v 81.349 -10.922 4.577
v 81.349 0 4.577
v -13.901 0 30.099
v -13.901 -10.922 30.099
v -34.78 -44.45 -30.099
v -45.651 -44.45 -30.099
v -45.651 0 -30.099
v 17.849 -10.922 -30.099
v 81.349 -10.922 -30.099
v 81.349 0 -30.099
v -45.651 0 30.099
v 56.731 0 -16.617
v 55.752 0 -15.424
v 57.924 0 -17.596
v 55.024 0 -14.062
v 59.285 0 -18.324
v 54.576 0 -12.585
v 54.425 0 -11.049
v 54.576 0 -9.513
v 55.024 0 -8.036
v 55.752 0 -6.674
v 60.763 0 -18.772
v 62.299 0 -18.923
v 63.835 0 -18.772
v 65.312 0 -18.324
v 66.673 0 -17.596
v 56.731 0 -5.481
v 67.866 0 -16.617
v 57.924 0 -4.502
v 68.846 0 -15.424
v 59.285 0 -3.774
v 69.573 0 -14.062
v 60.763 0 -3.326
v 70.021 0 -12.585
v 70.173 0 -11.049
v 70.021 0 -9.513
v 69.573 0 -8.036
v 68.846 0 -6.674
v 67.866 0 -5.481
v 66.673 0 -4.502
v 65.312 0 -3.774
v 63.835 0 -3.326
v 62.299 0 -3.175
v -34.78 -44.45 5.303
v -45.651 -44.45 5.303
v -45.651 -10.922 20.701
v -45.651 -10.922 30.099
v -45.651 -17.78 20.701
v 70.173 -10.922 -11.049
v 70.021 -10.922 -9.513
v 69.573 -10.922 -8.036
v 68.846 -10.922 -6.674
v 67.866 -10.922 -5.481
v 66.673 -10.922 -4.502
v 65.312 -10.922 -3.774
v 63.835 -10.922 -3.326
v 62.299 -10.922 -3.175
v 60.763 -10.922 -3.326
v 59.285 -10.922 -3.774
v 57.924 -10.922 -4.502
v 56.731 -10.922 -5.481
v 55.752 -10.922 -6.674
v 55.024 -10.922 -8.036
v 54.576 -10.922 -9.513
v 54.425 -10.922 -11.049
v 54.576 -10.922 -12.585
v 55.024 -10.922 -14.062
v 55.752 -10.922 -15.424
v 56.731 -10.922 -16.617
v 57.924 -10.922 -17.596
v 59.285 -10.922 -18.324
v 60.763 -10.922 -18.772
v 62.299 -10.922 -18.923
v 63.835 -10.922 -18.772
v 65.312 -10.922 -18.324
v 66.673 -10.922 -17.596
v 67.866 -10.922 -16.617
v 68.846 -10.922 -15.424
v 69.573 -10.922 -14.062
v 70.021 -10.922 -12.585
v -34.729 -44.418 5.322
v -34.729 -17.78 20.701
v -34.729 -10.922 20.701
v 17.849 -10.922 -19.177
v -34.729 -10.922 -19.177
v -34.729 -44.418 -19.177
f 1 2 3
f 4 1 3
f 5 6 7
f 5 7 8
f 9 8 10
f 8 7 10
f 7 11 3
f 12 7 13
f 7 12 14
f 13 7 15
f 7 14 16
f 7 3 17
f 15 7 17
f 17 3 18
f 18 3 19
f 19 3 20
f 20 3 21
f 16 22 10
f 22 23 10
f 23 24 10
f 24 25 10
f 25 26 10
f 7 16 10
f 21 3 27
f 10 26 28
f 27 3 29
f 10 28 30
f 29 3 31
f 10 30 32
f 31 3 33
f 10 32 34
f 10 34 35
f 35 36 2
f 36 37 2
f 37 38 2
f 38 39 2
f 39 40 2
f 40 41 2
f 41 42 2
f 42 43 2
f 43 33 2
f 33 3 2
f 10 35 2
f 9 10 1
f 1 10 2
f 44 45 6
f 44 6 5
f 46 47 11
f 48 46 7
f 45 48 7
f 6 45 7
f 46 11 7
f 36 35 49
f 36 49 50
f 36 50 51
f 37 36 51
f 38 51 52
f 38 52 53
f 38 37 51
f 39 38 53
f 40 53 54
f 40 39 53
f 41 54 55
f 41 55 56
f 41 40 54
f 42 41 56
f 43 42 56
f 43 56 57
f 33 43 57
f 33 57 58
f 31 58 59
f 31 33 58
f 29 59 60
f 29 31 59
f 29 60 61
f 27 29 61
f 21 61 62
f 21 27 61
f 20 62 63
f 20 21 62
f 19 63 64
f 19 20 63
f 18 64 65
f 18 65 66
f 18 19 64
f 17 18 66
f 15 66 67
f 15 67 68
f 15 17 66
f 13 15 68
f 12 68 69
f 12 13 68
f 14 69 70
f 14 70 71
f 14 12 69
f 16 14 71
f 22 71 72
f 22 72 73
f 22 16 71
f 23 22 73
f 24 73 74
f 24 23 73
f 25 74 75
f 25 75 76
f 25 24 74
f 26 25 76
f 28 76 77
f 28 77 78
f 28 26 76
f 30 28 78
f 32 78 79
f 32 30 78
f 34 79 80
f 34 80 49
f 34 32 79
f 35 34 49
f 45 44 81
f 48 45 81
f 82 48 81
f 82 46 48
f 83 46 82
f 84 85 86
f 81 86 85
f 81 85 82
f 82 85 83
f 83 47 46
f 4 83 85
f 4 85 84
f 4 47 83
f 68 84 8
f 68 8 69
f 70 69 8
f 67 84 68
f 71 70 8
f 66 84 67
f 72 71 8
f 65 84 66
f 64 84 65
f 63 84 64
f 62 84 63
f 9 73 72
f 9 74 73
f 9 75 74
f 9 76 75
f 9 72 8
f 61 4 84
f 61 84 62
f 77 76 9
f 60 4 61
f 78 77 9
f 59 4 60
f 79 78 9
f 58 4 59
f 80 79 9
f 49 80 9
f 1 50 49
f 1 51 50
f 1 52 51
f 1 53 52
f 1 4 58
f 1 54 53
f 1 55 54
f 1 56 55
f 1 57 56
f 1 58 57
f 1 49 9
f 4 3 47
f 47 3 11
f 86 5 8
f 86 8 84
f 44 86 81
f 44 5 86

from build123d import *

# Parameters (mm, degrees)
F0_W     = 10.922
F0_H     = 28.702
F0_W_2   = 52.578
F0_H_2   = 10.922
F0_R     = 7.874
F1_DEPTH = 10.922
F2_DEPTH = 44.45
F3_SIZE2 = 52.628408
F3_SIZE  = 33.52799
F4_SIZE2 = 15.3979316793
F4_SIZE  = 26.67


# Not quite as in the source:
# - a fillet or chamfer is up to 0.001 mm smaller than in the source, because OpenCascade refuses the exact size


with BuildPart() as f1:
    # F0 (on Front) → F1 (new body)
    with BuildSketch(Plane.XZ):
        with Locations((-40.1902680954, 6.35)):
            Rectangle(F0_W, F0_H)
        with Locations((-8.4402680954, -24.638)):
            Rectangle(F0_W_2, F0_H_2)
        Polygon((-13.9012680954, 30.099), (-45.6512680954, 30.099), (-45.6512680954, 20.701), (-34.7292680954, 20.701), (-34.7292680954, -8.001), (-34.7292680954, -19.177), (17.8487319046, -19.177), (17.8487319046, -30.099), (81.3487319046, -30.099), (81.3487319046, 4.5768394209), align=None)
        with Locations((62.2987319046, -11.049)):
            Circle(F0_R, mode=Mode.SUBTRACT)
        Polygon((-34.7292680954, -8.001), (-45.6512680954, -8.001), (-45.6512680954, -30.099), (-34.7292680954, -30.099), (-34.7292680954, -19.177), align=None)
    extrude(amount=F1_DEPTH)

    # F0 (on Front) → F2 (join)
    with BuildSketch(Plane.XZ):
        with Locations((-40.1902680954, 6.35)):
            Rectangle(F0_W, F0_H)
        with Locations((-8.4402680954, -24.638)):
            Rectangle(F0_W_2, F0_H_2)
        Polygon((-34.7292680954, -8.001), (-45.6512680954, -8.001), (-45.6512680954, -30.099), (-34.7292680954, -30.099), (-34.7292680954, -19.177), align=None)
    extrude(amount=F2_DEPTH)

    # F3 (size 33.528 and 52.6284180296 in the source; OpenCascade refuses exactly that, so slightly less here)
    f3_edges = [f1.edges().sort_by_distance(p)[0] for p in [
        (17.848732, -44.45, -24.638),
    ]]
    f3_side = f1.faces().sort_by_distance((17.848732, -27.686, -24.638))[0]
    chamfer(f3_edges, length=F3_SIZE, length2=F3_SIZE2, reference=f3_side)

    # F4
    f4_edges = [f1.edges().sort_by_distance(p)[0] for p in [
        (-40.215472, -44.45, 20.701),
    ]]
    f4_side = f1.faces().sort_by_distance((-40.19028, -27.685963, 20.701))[0]
    chamfer(f4_edges, length=F4_SIZE, length2=F4_SIZE2, reference=f4_side)


solid = f1.part
